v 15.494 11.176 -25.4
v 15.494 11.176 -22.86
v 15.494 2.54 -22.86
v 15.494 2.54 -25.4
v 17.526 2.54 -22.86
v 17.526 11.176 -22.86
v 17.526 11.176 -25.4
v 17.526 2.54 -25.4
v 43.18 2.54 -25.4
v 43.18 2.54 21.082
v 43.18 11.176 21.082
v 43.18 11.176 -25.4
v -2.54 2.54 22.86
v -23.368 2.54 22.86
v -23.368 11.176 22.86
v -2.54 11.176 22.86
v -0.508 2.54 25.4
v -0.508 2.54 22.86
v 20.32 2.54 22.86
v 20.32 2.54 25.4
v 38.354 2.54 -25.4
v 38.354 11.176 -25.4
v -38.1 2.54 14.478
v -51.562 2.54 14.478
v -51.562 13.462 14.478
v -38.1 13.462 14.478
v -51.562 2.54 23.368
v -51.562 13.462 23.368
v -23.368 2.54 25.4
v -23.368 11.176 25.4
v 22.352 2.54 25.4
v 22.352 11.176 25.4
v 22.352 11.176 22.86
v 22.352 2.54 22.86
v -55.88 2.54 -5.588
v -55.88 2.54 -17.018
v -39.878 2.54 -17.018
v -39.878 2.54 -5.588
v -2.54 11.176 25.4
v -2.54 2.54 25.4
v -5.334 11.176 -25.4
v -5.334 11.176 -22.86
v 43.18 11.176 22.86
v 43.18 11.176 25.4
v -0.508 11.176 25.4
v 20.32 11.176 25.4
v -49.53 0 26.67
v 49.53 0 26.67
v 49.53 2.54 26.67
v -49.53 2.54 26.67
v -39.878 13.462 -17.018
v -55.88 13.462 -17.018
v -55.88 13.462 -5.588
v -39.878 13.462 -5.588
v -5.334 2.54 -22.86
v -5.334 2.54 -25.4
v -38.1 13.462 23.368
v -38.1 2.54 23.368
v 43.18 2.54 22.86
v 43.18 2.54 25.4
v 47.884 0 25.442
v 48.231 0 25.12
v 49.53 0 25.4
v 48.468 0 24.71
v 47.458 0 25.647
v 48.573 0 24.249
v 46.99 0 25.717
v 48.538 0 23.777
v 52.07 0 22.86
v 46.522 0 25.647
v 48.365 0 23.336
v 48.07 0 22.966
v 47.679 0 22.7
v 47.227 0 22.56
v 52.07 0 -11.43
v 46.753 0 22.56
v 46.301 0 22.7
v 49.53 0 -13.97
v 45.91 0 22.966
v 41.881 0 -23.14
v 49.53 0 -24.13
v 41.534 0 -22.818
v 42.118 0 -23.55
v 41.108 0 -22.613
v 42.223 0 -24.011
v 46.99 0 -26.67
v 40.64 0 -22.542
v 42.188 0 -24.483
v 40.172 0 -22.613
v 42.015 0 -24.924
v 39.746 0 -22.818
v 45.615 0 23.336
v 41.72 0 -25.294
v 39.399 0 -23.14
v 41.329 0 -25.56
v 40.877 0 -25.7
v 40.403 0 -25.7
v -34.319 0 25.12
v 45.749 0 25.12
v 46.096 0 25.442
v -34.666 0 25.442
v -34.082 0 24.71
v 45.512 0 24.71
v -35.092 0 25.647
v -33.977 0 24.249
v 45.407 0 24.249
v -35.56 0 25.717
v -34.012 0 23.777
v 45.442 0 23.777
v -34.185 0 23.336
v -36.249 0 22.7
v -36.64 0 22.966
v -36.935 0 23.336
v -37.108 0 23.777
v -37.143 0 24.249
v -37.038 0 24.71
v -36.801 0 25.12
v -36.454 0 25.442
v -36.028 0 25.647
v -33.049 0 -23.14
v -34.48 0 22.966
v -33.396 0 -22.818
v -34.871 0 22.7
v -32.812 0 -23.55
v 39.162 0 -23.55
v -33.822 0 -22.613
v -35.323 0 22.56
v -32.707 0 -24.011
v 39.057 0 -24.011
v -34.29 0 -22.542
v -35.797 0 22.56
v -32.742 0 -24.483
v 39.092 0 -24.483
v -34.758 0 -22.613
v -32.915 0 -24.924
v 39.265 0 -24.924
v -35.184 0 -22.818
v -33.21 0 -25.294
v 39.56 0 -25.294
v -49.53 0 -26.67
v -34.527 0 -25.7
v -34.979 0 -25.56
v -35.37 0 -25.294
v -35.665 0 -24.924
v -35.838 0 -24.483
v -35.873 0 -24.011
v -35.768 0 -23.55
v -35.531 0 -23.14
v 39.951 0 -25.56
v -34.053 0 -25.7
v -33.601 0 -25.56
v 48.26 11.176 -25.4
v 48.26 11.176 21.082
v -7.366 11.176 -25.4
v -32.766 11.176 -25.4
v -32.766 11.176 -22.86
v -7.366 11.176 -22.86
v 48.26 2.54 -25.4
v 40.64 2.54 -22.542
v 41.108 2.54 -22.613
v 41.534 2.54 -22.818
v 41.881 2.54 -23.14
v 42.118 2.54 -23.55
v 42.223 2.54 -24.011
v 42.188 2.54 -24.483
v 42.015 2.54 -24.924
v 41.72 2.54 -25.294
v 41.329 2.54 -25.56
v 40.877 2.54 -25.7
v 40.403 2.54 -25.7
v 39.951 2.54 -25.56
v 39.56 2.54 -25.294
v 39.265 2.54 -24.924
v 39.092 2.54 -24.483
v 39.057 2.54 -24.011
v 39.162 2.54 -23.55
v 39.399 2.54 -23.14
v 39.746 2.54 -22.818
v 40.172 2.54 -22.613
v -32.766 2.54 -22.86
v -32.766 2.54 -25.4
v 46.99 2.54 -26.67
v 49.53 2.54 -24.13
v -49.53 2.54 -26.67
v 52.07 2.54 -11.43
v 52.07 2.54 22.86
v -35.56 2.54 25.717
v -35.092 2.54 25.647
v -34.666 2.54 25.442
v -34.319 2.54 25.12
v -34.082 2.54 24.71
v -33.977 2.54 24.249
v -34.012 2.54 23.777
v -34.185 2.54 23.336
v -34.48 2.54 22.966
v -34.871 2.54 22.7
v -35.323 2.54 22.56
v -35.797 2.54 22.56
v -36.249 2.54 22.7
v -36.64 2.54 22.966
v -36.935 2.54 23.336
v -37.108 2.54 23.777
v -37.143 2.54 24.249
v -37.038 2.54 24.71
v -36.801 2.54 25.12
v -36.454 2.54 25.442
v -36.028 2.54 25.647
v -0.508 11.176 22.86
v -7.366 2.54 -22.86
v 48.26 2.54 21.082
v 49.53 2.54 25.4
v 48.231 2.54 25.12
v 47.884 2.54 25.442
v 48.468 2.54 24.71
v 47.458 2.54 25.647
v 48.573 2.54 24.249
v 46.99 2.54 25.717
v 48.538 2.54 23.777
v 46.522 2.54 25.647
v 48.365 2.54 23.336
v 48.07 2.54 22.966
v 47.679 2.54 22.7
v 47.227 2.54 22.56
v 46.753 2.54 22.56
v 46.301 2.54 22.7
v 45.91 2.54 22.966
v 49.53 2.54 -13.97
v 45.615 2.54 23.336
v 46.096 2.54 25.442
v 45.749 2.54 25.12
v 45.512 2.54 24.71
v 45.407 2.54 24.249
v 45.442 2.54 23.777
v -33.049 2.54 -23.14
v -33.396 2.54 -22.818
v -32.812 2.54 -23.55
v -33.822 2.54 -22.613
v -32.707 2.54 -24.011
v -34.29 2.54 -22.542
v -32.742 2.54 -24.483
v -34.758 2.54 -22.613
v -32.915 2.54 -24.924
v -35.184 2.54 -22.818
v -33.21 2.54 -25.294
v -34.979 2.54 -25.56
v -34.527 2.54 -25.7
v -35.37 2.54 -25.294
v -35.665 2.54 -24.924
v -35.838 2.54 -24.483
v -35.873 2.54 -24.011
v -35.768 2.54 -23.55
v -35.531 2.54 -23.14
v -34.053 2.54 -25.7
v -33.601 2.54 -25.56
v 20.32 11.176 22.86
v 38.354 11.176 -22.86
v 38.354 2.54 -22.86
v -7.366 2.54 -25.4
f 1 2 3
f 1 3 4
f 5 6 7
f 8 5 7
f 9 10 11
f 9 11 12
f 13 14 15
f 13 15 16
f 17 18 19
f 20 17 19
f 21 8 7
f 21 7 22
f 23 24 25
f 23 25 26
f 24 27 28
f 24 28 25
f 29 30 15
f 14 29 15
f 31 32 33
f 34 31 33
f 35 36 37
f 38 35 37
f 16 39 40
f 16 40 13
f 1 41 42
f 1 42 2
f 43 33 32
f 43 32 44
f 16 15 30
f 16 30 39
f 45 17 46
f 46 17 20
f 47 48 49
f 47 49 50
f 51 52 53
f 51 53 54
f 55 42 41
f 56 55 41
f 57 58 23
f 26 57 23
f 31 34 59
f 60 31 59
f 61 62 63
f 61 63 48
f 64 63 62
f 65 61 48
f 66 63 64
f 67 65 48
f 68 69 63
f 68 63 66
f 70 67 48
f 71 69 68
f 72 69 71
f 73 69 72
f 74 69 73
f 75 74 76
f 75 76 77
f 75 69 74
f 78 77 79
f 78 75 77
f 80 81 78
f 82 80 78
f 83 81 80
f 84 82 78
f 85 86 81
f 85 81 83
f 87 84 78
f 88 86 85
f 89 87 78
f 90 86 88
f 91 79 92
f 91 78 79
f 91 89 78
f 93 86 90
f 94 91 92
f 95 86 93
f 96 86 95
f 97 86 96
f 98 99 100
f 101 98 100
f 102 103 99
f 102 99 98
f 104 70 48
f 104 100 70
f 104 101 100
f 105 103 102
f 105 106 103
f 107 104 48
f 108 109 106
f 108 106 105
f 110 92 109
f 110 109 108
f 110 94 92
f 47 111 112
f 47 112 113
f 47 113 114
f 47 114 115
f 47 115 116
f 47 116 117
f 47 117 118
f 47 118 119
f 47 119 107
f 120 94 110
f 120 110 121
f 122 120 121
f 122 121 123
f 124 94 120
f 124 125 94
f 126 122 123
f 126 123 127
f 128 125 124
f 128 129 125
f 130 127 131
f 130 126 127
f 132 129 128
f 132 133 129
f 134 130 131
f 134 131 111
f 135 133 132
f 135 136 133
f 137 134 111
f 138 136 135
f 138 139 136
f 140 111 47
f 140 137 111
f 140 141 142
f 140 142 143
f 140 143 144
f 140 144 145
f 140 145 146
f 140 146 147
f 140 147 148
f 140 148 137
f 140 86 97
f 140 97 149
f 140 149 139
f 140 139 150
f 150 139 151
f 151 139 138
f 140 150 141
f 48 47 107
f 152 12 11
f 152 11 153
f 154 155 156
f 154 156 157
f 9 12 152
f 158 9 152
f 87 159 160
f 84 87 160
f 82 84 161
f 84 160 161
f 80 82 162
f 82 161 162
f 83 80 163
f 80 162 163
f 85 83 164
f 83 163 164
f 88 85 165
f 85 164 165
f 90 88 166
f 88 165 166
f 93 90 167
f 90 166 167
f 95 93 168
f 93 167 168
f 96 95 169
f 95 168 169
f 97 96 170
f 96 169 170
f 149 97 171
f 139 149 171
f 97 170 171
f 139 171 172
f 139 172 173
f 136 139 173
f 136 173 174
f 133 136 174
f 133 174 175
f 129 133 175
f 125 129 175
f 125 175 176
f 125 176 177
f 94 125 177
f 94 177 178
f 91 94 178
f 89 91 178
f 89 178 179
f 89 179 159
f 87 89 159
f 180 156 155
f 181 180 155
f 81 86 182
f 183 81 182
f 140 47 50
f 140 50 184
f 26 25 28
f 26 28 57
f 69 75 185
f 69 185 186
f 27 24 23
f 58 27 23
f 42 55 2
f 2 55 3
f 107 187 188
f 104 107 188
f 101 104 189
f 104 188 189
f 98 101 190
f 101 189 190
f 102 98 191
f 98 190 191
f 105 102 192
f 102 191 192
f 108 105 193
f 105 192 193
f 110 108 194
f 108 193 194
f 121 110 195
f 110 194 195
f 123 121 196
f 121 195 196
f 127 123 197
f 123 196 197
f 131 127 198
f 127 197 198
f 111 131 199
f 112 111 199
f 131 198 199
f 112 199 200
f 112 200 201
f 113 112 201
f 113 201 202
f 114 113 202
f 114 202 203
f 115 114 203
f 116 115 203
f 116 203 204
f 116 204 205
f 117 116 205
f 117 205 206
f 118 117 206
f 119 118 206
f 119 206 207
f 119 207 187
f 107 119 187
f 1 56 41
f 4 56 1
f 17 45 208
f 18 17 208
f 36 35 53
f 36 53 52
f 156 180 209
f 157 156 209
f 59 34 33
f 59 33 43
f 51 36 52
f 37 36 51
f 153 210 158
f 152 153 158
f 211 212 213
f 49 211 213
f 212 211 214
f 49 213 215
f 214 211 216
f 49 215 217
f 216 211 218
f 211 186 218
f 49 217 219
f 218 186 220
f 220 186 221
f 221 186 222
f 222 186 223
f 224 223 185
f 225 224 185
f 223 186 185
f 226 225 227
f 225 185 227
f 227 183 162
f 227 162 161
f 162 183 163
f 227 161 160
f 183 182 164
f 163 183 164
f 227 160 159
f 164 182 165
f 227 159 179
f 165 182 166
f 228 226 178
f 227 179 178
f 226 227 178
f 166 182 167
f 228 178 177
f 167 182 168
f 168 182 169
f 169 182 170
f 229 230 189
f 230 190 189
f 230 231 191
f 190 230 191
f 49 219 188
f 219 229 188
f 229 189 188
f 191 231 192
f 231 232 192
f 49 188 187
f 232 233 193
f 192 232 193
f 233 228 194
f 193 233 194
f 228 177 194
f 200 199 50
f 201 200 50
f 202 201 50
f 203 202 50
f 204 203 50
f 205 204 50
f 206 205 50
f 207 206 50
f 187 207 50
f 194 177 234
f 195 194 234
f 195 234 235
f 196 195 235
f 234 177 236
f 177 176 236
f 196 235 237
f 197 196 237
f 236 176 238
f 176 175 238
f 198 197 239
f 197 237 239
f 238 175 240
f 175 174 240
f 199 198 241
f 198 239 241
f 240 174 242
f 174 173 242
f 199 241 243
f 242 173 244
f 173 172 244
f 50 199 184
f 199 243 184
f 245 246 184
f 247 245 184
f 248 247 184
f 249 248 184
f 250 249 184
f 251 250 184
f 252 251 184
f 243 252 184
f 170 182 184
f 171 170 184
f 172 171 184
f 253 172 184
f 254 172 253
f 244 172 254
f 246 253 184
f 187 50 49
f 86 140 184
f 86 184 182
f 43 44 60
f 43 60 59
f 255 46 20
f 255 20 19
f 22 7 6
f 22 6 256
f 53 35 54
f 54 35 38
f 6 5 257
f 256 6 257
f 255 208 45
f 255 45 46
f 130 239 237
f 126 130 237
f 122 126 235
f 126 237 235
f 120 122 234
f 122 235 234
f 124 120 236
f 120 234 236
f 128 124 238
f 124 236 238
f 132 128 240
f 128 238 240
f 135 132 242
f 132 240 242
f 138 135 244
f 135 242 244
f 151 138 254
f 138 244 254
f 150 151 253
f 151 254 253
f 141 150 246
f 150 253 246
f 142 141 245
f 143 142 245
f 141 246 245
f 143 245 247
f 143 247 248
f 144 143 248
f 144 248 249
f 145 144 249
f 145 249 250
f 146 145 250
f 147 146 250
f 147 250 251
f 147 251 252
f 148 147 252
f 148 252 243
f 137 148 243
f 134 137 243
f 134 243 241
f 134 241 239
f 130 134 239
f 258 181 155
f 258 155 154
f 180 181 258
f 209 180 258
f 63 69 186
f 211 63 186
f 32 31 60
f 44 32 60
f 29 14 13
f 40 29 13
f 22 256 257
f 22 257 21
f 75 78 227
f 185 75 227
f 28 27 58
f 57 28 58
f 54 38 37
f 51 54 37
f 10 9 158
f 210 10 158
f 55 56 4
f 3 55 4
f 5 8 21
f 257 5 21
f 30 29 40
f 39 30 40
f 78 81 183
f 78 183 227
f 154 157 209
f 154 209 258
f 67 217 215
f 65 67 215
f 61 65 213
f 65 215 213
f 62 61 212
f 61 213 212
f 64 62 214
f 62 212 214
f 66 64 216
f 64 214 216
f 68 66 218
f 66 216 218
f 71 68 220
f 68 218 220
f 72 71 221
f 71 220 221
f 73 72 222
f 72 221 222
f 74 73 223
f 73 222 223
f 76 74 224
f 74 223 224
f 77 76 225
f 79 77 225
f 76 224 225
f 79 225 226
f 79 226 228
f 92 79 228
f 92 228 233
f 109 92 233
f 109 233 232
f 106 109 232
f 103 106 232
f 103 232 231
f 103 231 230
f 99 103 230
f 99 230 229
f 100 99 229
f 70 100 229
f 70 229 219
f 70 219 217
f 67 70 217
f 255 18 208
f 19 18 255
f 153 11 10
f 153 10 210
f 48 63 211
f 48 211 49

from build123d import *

# Parameters (mm, degrees)
BOSS_EXTRUDE1_DEPTH   = 2.54
SKETCH3_R             = 1.5875
CUT_EXTRUDE1_DEPTH    = 59.557880768
CHAMFER1_SIZE         = 2.54
SKETCH4_W             = 25.4
SKETCH4_H             = 2.54
BOSS_EXTRUDE2_DEPTH   = 8.636
SKETCH4_W_2           = 20.828
BOSS_EXTRUDE2_2_DEPTH = 8.636
BOSS_EXTRUDE2_3_DEPTH = 8.636
SKETCH4_W_3           = 5.08
SKETCH4_H_2           = 46.482
BOSS_EXTRUDE2_4_DEPTH = 8.636
BOSS_EXTRUDE2_5_DEPTH = 8.636
BOSS_EXTRUDE2_6_DEPTH = 8.636
BOSS_EXTRUDE2_7_DEPTH = 8.636
SKETCH5_W             = 16.002
SKETCH5_H             = 11.43
BOSS_EXTRUDE3_DEPTH   = 10.922
SKETCH5_W_2           = 13.462
SKETCH5_H_2           = 8.89
BOSS_EXTRUDE3_2_DEPTH = 10.922


with BuildPart() as part:
    # Sketch2 → Boss-Extrude1 (new body)
    with BuildSketch(Plane(origin=(0, 0, 0), x_dir=(1, 0, 0), z_dir=(0, 1, 0))):
        Polygon((-49.53, 26.67), (49.53, 26.67), (49.53, 13.97), (52.07, 13.97), (52.07, -25.4), (49.53, -25.4), (49.53, -26.67), (-49.53, -26.67), align=None)
    extrude(amount=BOSS_EXTRUDE1_DEPTH)

    # Sketch3 → Cut-Extrude1 (cut, through all)
    with BuildSketch(Plane(origin=(0, 2.54, 0), x_dir=(1, 0, 0), z_dir=(0, 1, 0))):
        with Locations(Location((-34.29, 24.13, 0), (0, 0, 270))):
            Circle(SKETCH3_R)
        with Locations(Location((40.64, 24.13, 0), (0, 0, 270))):
            Circle(SKETCH3_R)
        with Locations(Location((46.99, -24.13, 0), (0, 0, 270))):
            Circle(SKETCH3_R)
        with Locations(Location((-35.56, -24.13, 0), (0, 0, 270))):
            Circle(SKETCH3_R)
    extrude(amount=-CUT_EXTRUDE1_DEPTH, mode=Mode.SUBTRACT)

    # Chamfer1
    chamfer1_edges = [part.edges().sort_by_distance(p)[0] for p in [
        (52.07, 1.27, 25.4),
        (49.53, 1.27, -26.67),
        (52.07, 1.27, -13.97),
    ]]
    chamfer(chamfer1_edges, length=CHAMFER1_SIZE - 0.0001)  # a hair under: the kernel refuses the full size


with BuildPart() as body_2:
    # Sketch4 → Boss-Extrude2 (new body)
    with BuildSketch(Plane(origin=(0, 2.54, 0), x_dir=(1, 0, 0), z_dir=(0, 1, 0))):
        with Locations((-20.066, 24.13)):
            Rectangle(SKETCH4_W, SKETCH4_H)
    extrude(amount=BOSS_EXTRUDE2_DEPTH)


with BuildPart() as body_3:
    # Sketch4 → Boss-Extrude2 2 (new body)
    with BuildSketch(Plane(origin=(0, 2.54, 0), x_dir=(1, 0, 0), z_dir=(0, 1, 0))):
        with Locations((5.08, 24.13)):
            Rectangle(SKETCH4_W_2, SKETCH4_H)
    extrude(amount=BOSS_EXTRUDE2_2_DEPTH)


with BuildPart() as body_4:
    # Sketch4 → Boss-Extrude2 3 (new body)
    with BuildSketch(Plane(origin=(0, 2.54, 0), x_dir=(1, 0, 0), z_dir=(0, 1, 0))):
        with Locations((27.94, 24.13)):
            Rectangle(SKETCH4_W_2, SKETCH4_H)
    extrude(amount=BOSS_EXTRUDE2_3_DEPTH)


with BuildPart() as body_5:
    # Sketch4 → Boss-Extrude2 4 (new body)
    with BuildSketch(Plane(origin=(0, 2.54, 0), x_dir=(1, 0, 0), z_dir=(0, 1, 0))):
        with Locations((45.72, 2.159)):
            Rectangle(SKETCH4_W_3, SKETCH4_H_2)
    extrude(amount=BOSS_EXTRUDE2_4_DEPTH)


with BuildPart() as body_6:
    # Sketch4 → Boss-Extrude2 5 (new body)
    with BuildSketch(Plane(origin=(0, 2.54, 0), x_dir=(1, 0, 0), z_dir=(0, 1, 0))):
        with Locations((32.766, -24.13)):
            Rectangle(SKETCH4_W_2, SKETCH4_H)
    extrude(amount=BOSS_EXTRUDE2_5_DEPTH)


with BuildPart() as body_7:
    # Sketch4 → Boss-Extrude2 6 (new body)
    with BuildSketch(Plane(origin=(0, 2.54, 0), x_dir=(1, 0, 0), z_dir=(0, 1, 0))):
        with Locations((9.906, -24.13)):
            Rectangle(SKETCH4_W_2, SKETCH4_H)
    extrude(amount=BOSS_EXTRUDE2_6_DEPTH)


with BuildPart() as body_8:
    # Sketch4 → Boss-Extrude2 7 (new body)
    with BuildSketch(Plane(origin=(0, 2.54, 0), x_dir=(1, 0, 0), z_dir=(0, 1, 0))):
        with Locations((-12.954, -24.13)):
            Rectangle(SKETCH4_W_2, SKETCH4_H)
    extrude(amount=BOSS_EXTRUDE2_7_DEPTH)


with BuildPart() as body_9:
    # Sketch5 → Boss-Extrude3 (new body)
    with BuildSketch(Plane(origin=(0, 2.54, 0), x_dir=(1, 0, 0), z_dir=(0, 1, 0))):
        with Locations((-47.879, 11.303)):
            Rectangle(SKETCH5_W, SKETCH5_H)
    extrude(amount=BOSS_EXTRUDE3_DEPTH)


with BuildPart() as body_10:
    # Sketch5 → Boss-Extrude3 2 (new body)
    with BuildSketch(Plane(origin=(0, 2.54, 0), x_dir=(1, 0, 0), z_dir=(0, 1, 0))):
        with Locations((-44.831, -18.923)):
            Rectangle(SKETCH5_W_2, SKETCH5_H_2)
    extrude(amount=BOSS_EXTRUDE3_2_DEPTH)


solid = Compound([part.part, body_2.part, body_3.part, body_4.part, body_5.part, body_6.part, body_7.part, body_8.part, body_9.part, body_10.part])
